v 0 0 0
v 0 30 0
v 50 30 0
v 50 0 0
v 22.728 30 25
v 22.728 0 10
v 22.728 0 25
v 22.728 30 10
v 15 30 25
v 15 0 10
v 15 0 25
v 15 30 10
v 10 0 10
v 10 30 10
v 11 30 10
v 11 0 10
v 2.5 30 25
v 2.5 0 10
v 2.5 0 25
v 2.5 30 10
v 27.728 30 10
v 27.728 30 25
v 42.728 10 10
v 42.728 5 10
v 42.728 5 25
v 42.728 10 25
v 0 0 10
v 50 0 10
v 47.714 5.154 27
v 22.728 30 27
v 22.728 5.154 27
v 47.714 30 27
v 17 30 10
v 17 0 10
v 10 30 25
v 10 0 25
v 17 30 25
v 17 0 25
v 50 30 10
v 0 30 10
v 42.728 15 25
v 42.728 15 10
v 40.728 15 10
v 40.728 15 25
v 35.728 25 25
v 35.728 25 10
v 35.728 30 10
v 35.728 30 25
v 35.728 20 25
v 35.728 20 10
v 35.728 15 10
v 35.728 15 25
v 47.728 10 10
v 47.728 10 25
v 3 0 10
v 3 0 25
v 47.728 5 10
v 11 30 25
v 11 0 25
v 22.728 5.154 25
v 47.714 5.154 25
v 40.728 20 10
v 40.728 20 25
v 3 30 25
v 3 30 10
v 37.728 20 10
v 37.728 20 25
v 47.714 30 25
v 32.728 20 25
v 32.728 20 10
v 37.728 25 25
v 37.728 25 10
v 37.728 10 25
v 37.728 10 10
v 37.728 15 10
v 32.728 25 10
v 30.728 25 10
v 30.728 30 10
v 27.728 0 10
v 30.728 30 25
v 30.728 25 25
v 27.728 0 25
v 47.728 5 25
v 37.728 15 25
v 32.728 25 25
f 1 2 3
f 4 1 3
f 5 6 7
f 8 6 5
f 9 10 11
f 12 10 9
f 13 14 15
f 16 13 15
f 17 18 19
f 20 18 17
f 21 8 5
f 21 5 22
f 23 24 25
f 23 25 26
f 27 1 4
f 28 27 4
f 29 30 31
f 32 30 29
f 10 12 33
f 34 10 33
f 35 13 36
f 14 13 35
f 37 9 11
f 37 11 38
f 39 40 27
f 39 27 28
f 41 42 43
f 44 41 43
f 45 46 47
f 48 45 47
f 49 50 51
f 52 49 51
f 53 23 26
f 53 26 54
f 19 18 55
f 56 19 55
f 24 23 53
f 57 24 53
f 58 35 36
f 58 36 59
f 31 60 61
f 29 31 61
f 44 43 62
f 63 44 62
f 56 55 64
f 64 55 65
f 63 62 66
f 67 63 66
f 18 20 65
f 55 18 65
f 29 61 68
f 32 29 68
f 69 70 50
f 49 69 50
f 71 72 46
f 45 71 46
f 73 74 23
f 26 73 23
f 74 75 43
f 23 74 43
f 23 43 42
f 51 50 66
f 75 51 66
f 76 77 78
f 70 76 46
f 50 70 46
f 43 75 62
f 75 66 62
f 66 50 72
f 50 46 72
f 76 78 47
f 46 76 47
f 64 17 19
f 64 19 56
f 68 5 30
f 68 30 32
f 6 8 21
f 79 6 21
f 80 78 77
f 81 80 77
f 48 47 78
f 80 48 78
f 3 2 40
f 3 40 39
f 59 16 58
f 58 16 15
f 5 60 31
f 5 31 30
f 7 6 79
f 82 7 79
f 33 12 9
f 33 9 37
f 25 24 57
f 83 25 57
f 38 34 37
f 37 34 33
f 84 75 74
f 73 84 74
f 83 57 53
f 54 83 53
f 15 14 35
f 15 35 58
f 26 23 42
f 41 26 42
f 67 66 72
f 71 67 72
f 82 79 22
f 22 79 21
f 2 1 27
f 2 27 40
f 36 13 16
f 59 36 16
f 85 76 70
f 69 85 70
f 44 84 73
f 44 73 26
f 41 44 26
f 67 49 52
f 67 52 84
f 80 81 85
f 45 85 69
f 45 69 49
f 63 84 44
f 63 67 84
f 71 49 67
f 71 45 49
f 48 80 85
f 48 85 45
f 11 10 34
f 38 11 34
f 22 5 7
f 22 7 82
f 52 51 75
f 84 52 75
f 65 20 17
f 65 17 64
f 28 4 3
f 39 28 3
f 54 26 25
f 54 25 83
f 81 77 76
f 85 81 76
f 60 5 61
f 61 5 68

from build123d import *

# Parameters (mm, degrees)
F0_W     = 50
F0_H     = 30
F1_DEPTH = 10
F2_W     = 0.5
F2_H     = 30
F2_W_2   = 1
F2_W_3   = 2
F2_W_4   = 5
F2_H_2   = 5
F3_DEPTH = 15
F4_W     = 24.985239
F4_H     = 24.846307
F5_DEPTH = 2


with BuildPart() as f1:
    # F0 (on Top) → F1 (new body)
    with BuildSketch(Plane.XY):
        with Locations((25, 15)):
            Rectangle(F0_W, F0_H)
    extrude(amount=F1_DEPTH)


with BuildPart() as f3:
    # F2 (on face) → F3 (new body)
    with BuildSketch(Plane.XY.offset(10)):
        with Locations((2.75, 15)):
            Rectangle(F2_W, F2_H)
        with Locations((10.5, 15)):
            Rectangle(F2_W_2, F2_H)
        with Locations((16, 15)):
            Rectangle(F2_W_3, F2_H)
        with Locations((25.228372, 15)):
            Rectangle(F2_W_4, F2_H)
        with Locations((45.228372, 7.5)):
            Rectangle(F2_W_4, F2_H_2)
        Polygon((35.728372, 30), (30.728372, 30), (30.728372, 25), (32.728372, 25), (35.728372, 25), align=None)
        Polygon((37.728372, 25), (35.728372, 25), (32.728372, 25), (32.728372, 20), (35.728372, 20), (37.728372, 20), align=None)
        Polygon((40.728372, 20), (37.728372, 20), (35.728372, 20), (35.728372, 15), (37.728372, 15), (40.728372, 15), align=None)
        Polygon((42.728372, 15), (40.728372, 15), (37.728372, 15), (37.728372, 10), (42.728372, 10), align=None)
    extrude(amount=F3_DEPTH)


with BuildPart() as f5:
    # F4 (on face) → F5 (new body)
    with BuildSketch(Plane.XY.offset(25)):
        with Locations((35.220991, 17.576846)):
            Rectangle(F4_W, F4_H)
    extrude(amount=F5_DEPTH)


solid = Compound([f1.part, f3.part, f5.part])
